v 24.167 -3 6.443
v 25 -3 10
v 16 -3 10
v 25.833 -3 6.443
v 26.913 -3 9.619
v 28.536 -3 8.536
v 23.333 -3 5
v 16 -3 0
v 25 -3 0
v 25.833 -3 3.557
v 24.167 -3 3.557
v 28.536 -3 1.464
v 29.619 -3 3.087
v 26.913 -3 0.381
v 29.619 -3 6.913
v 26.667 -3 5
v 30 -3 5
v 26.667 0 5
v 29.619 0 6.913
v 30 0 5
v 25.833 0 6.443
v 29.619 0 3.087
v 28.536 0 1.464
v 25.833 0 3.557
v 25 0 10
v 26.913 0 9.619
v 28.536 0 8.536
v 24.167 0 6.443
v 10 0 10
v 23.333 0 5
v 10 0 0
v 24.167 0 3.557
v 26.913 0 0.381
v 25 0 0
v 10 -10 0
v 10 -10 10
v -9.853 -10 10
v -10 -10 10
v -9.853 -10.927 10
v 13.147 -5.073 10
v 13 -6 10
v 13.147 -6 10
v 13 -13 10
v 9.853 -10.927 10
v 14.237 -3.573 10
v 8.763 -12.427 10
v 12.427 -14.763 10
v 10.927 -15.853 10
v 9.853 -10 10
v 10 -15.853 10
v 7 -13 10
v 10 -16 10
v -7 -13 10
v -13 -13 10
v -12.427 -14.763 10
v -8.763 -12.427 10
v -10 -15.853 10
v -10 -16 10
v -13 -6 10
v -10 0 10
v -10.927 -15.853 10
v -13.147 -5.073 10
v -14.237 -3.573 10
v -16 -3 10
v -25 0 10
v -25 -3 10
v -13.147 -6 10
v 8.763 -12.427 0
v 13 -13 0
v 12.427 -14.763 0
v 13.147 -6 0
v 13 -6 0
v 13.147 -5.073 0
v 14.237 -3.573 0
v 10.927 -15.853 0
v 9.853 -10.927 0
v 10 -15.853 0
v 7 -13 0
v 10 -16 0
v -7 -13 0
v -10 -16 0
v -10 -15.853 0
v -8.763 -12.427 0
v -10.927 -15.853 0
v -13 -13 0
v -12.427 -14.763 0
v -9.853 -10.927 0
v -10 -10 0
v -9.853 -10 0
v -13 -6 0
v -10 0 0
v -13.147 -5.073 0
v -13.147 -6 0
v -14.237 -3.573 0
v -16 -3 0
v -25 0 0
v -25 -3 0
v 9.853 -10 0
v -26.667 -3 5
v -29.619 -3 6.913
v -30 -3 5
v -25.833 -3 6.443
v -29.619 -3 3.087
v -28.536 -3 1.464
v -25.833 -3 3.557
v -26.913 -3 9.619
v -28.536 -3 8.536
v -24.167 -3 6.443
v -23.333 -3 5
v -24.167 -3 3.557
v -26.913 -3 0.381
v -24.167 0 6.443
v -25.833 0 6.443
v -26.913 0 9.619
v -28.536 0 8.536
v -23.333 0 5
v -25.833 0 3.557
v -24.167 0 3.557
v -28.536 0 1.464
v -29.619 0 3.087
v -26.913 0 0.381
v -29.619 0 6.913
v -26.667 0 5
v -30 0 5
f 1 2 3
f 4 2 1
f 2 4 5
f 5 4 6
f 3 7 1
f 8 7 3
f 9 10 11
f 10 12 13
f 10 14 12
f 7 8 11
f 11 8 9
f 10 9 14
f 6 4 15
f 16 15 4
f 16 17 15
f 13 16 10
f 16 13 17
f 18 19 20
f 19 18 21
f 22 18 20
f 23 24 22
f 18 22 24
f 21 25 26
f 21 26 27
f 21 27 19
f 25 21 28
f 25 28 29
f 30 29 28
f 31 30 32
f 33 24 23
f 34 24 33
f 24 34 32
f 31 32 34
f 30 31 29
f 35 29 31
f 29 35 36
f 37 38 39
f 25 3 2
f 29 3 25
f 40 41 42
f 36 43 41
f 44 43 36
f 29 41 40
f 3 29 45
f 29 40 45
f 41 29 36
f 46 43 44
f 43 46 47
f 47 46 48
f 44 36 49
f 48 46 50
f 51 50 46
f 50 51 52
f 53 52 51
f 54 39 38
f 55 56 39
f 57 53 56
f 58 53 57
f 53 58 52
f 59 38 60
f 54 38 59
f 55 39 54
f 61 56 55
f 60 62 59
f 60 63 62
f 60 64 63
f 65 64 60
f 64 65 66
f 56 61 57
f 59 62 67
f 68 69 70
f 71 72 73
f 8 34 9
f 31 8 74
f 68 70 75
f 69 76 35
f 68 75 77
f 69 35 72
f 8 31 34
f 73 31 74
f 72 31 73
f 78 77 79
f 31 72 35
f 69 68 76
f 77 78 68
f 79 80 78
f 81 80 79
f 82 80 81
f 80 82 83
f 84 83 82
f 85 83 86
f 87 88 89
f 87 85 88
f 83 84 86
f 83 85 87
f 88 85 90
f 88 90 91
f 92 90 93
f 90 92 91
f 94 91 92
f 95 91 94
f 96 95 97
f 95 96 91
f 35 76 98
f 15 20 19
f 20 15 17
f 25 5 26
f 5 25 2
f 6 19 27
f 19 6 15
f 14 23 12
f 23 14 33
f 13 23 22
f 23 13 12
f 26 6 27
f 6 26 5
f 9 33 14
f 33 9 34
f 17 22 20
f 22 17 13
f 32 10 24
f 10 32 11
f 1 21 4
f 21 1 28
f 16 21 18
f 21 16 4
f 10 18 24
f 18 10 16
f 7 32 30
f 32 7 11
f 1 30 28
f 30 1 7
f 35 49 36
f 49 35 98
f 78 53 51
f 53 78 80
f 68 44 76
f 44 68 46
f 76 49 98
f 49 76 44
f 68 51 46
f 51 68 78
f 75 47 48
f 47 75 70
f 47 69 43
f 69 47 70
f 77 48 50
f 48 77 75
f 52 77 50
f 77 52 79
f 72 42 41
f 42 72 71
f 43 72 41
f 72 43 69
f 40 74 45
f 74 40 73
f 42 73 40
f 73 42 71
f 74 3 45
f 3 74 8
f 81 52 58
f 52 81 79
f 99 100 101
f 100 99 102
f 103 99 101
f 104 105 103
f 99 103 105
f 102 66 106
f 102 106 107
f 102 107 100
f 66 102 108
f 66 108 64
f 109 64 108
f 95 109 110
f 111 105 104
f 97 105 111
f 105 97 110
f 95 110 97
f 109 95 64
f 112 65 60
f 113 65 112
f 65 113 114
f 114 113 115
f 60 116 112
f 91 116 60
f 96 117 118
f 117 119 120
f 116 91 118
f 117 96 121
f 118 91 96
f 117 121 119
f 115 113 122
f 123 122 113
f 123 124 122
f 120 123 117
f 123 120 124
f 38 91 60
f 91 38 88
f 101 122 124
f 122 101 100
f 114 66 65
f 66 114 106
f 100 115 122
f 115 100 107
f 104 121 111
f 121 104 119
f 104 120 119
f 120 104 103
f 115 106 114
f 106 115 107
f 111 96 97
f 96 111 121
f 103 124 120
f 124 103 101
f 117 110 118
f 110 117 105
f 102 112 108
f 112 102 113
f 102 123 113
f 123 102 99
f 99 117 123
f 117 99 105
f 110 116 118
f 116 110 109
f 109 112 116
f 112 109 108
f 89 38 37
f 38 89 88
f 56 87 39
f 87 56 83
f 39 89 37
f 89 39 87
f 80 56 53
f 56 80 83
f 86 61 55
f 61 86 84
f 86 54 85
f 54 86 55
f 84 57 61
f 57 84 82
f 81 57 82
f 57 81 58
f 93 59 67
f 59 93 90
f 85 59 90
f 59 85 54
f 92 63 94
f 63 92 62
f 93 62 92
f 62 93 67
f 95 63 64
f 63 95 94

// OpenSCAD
width=10;
length=20;
height=13;
thickness=3;
winglength=15;

module wing() {
    difference(){
        union(){
            translate(v=[(length /2),0,0]) cube(size=[winglength,width,thickness] );
            translate(v=[winglength +(length /2),width/2,0]) cylinder(h=thickness,r=width/2);
        }
        //holes
        translate(v=[winglength + (length/2) ,width/2,0]) cylinder(h=thickness,r=width/6);
    }


        

    // top
    translate([0,0,height]) cube([(length /2),width,thickness]);
    translate([(length /2),0,height]) rotate(a=[-90, 90,0]) fillet();
    translate([(length /2), 0, height]) corner();
    
    //vertical
    translate(v=[(length /2),0,0]) cube([thickness,width,height]);    
    translate([(length /2)+ thickness,0,thickness]) rotate(a=[-90, -90,0]) fillet();
 
}

  //  wing(); 
rotate(a=[90, 0, 0]) { 
    wing(); 
    mirror() wing();
}


module fillet () {
difference()  {
    cube(size=[thickness, thickness, width]);
    translate([thickness, thickness, 0]) cylinder(h=width, r=thickness  );
    }
}    

module corner () {
    intersection() {
       translate(v=[0,width,0]) rotate(a=[90,0,0]) cylinder(h=width, r=thickness);
       cube([thickness, width, thickness]);
    }
}
    
    
